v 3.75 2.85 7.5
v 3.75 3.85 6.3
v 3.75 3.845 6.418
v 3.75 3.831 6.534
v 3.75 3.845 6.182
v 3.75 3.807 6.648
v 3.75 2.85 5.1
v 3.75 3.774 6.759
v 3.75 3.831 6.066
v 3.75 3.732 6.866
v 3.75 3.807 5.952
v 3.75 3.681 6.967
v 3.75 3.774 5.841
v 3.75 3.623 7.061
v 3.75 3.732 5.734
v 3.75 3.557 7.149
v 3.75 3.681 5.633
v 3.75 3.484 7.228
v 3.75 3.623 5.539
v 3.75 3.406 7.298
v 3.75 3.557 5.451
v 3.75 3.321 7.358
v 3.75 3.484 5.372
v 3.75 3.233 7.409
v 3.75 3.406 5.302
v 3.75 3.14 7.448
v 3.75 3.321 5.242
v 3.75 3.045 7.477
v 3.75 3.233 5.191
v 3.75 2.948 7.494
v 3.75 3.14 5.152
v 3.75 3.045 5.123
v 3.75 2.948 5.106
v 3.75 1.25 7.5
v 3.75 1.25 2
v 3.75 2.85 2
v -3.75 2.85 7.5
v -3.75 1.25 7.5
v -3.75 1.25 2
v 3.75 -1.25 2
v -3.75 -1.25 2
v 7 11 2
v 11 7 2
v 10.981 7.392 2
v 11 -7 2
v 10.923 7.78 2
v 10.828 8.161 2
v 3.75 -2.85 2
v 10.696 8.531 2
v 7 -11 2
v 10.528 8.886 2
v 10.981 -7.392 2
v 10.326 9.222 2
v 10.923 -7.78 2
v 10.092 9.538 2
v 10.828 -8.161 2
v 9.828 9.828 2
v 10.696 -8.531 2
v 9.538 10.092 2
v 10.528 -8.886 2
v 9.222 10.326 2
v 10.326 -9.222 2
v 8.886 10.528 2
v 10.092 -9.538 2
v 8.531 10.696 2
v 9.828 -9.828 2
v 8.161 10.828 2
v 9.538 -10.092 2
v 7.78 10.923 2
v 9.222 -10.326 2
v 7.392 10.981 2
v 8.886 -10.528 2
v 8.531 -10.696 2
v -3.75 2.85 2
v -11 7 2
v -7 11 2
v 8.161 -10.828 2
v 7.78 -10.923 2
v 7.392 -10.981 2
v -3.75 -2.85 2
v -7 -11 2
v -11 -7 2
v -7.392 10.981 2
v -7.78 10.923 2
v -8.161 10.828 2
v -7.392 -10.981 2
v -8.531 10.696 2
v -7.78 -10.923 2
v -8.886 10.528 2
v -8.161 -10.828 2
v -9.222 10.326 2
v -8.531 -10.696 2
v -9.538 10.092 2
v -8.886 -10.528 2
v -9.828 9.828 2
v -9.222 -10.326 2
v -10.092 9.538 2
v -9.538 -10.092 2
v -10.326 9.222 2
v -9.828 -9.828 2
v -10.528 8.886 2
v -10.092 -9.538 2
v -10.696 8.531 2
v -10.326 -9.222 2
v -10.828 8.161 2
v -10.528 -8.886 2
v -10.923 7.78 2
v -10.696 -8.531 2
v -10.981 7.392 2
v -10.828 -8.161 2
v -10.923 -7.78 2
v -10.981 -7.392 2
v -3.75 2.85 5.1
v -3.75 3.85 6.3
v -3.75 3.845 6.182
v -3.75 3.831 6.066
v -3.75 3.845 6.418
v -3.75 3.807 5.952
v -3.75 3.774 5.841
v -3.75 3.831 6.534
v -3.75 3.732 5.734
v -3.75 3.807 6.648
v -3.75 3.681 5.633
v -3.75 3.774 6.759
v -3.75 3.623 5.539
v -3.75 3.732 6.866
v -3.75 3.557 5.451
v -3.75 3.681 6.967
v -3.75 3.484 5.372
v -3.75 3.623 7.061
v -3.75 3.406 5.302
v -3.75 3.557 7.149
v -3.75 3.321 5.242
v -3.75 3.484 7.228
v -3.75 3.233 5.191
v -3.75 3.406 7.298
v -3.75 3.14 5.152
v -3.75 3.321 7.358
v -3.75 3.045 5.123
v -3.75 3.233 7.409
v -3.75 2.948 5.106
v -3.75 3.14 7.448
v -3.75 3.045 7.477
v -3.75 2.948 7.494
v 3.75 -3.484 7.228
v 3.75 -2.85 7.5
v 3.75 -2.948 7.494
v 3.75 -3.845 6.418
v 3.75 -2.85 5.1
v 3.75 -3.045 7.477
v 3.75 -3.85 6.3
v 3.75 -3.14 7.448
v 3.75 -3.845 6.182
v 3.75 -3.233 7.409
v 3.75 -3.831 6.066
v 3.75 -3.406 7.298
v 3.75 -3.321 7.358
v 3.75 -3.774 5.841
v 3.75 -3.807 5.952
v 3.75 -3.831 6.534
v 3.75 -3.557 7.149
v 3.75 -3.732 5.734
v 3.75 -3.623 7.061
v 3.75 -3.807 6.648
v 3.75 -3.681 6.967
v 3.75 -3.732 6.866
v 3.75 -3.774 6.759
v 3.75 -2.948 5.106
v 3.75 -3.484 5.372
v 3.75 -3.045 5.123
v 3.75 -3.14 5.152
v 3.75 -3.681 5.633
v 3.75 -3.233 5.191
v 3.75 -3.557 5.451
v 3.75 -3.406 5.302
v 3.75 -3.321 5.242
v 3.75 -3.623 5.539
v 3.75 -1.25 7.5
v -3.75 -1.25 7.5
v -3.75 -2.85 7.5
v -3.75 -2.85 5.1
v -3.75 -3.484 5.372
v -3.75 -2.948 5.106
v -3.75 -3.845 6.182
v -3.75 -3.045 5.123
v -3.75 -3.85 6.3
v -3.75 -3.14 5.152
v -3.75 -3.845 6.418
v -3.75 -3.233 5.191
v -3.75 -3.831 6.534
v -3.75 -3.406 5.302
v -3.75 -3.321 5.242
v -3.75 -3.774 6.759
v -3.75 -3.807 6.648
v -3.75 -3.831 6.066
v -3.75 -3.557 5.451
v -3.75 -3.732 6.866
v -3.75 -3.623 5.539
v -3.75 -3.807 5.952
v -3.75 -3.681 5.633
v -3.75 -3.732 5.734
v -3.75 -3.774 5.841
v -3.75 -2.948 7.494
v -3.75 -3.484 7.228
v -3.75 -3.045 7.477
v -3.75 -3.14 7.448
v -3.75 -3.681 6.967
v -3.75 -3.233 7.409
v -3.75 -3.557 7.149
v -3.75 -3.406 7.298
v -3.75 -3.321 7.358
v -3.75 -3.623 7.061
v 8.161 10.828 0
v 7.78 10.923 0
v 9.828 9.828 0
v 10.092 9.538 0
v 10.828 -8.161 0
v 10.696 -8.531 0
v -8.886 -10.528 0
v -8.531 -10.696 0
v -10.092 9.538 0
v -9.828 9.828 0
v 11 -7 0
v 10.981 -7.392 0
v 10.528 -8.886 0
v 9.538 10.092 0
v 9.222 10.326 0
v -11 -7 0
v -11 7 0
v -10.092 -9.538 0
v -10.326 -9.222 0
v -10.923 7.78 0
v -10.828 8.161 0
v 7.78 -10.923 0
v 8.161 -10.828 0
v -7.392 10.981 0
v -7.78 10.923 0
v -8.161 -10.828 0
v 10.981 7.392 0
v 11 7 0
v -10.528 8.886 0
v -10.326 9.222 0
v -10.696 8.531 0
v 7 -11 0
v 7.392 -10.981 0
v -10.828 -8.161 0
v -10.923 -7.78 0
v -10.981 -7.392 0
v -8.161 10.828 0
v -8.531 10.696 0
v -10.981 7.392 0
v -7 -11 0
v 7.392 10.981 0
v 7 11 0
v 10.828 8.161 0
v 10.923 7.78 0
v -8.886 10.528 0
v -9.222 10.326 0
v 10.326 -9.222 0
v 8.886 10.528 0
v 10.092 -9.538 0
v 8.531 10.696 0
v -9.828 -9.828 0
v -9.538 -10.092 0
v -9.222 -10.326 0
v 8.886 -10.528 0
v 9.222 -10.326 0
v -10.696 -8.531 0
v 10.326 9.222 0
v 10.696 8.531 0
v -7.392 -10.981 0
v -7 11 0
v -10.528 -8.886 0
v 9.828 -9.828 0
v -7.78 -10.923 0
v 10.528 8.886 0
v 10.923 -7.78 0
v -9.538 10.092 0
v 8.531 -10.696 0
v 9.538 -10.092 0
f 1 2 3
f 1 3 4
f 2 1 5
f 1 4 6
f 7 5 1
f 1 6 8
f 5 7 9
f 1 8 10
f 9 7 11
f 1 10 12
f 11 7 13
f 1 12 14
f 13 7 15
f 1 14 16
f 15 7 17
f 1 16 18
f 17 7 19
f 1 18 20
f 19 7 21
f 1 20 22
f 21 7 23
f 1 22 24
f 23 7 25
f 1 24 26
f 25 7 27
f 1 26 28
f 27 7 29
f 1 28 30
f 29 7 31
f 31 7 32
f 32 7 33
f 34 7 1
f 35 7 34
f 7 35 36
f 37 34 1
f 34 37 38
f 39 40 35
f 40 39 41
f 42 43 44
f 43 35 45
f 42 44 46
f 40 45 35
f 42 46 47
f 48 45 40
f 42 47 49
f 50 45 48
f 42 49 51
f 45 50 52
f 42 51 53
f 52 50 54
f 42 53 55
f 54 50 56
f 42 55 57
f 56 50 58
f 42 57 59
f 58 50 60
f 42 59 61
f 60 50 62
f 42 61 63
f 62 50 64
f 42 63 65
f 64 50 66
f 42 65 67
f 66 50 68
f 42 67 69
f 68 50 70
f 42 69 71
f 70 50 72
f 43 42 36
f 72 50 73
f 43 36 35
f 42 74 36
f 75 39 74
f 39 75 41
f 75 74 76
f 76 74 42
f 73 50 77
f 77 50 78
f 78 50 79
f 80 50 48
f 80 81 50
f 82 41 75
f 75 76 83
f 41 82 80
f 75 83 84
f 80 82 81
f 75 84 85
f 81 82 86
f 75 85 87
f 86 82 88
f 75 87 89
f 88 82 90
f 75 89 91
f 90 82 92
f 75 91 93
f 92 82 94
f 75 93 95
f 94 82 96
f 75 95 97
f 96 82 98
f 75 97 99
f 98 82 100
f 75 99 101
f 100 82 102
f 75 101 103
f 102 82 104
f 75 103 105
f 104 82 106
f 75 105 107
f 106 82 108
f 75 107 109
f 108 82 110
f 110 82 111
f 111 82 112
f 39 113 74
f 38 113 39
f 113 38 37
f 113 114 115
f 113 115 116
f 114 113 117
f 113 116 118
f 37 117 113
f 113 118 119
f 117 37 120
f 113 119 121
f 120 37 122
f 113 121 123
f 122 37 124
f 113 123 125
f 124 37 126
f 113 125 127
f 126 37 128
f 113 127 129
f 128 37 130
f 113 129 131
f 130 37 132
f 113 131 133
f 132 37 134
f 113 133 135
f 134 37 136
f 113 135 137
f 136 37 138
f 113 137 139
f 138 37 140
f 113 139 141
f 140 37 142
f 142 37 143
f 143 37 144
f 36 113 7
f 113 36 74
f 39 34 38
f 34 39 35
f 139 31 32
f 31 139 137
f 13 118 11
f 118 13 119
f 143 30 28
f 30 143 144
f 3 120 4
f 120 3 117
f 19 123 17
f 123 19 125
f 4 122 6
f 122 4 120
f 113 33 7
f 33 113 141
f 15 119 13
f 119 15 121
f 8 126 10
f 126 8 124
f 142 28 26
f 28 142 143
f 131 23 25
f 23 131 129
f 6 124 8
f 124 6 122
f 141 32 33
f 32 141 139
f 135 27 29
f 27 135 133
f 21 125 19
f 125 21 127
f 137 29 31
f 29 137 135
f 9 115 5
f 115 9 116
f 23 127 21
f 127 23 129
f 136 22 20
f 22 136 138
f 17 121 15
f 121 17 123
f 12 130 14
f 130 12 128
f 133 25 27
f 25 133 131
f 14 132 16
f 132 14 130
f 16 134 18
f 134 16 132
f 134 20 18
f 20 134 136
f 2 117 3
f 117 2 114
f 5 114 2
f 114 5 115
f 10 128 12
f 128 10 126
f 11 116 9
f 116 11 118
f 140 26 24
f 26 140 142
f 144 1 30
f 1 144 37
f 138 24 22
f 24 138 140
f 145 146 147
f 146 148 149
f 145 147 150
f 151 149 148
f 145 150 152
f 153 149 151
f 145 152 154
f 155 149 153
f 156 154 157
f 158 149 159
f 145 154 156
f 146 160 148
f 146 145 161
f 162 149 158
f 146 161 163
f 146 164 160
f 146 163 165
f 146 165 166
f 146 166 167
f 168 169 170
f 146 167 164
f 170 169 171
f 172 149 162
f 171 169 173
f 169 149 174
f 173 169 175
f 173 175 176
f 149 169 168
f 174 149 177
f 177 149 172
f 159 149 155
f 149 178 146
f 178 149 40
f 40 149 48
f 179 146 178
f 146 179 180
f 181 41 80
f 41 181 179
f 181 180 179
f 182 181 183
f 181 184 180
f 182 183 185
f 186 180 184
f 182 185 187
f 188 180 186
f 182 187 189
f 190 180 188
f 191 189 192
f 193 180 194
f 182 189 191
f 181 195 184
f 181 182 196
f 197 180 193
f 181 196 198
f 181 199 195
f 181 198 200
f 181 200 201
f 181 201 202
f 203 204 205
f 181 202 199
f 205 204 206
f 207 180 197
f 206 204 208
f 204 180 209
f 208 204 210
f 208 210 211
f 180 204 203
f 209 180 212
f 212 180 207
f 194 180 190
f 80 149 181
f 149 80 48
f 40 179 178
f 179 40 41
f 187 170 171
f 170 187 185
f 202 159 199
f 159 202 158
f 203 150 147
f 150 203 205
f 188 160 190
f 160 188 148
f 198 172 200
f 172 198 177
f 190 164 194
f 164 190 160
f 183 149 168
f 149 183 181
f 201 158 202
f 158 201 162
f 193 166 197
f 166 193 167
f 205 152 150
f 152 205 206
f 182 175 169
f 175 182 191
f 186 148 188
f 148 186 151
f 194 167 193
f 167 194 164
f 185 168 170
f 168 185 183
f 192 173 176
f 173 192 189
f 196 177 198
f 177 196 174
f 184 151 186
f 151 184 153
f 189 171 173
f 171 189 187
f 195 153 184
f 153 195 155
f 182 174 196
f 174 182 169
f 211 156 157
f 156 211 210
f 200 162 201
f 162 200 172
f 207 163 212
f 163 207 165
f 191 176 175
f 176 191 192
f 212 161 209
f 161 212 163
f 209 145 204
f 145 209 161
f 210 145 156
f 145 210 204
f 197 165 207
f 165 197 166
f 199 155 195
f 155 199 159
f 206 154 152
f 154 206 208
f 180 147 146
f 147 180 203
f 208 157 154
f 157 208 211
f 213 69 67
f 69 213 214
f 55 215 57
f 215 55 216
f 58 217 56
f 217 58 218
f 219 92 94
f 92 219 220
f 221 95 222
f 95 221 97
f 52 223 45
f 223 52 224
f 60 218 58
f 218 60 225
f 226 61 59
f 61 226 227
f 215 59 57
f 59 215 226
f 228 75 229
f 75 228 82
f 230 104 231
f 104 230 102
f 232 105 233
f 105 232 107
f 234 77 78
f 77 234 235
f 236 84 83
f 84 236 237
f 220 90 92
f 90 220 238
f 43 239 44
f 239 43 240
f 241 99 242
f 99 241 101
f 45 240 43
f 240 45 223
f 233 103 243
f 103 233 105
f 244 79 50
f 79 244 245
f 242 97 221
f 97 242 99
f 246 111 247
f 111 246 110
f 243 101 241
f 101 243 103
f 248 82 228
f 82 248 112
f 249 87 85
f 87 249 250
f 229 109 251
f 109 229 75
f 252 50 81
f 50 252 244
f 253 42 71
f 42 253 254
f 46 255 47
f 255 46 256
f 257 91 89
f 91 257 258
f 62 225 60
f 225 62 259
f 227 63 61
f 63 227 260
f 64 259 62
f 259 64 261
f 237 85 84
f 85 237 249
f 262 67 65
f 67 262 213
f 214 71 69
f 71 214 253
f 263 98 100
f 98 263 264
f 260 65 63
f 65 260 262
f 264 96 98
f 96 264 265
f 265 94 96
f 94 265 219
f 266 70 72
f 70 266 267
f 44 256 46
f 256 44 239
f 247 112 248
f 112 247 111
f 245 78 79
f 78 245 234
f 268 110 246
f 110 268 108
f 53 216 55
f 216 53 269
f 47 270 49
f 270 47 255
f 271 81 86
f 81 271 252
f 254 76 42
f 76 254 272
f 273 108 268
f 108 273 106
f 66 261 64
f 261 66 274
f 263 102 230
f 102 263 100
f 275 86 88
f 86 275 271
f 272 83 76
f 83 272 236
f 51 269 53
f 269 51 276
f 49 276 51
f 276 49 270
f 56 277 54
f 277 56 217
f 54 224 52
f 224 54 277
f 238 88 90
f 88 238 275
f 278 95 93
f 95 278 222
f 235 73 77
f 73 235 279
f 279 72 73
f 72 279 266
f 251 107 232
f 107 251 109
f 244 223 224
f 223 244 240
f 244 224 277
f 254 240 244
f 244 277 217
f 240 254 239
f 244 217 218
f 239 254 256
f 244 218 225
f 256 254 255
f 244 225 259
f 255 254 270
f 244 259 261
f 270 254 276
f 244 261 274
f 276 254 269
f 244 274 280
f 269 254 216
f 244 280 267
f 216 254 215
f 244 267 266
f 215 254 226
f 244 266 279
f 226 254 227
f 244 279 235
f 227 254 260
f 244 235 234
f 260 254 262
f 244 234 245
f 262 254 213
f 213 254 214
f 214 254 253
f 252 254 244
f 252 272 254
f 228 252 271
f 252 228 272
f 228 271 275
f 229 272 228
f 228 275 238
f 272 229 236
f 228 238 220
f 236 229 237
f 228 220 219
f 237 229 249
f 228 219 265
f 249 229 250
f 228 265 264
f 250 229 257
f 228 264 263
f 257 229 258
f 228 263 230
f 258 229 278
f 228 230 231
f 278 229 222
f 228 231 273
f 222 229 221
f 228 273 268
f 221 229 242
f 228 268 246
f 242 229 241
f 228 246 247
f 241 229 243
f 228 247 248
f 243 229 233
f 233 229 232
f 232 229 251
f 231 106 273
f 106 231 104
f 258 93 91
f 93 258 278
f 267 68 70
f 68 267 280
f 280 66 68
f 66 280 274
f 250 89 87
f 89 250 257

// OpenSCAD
$fn=64;

//28,10
poleR=10;



// clip();

// buckleHalf();

// translate([0,40,0]) buckleBottom();

// translate([0,0,1]) mirror([0,0,1]) 
//  buckleTop();



// buckle();

// mirror([0,0,1]) translate([20,-5,4]) button();

buttonCap();

//barClamp();
// difference() {
//   cylinder(r=4,h=6);
//   screwHole(23,true);
// }

module barClamp() {
  h=20;
  ir=11;
  ga=30;

  translate([0,0,-10]) intersection() {
    difference() {
      cylinder(r=ir+3,h=h);
      translate([0,0,-0.1]) cylinder(r=ir,h=h+0.2);
    }
    union() {
      translate([-1000,0,0]) cube([2000,1000,1000]);
      rotate([0,0,ga]) translate([-1000,-1000,0]) cube([2000,1000,1000]);
    }
  }
  translate([-10-ir-3,3,0]) mirror([1,0,0]) rotate([90,0,0]) tabThing(3);
  rotate([0,0,ga]) translate([-10-ir-3,0,0]) mirror([1,0,0]) rotate([90,0,0]) tabThing(3);
}

module buttonCap() {
  hull() {
    translate([-7,-7,0]) cylinder(r=4,h=2);
    translate([7,7,0]) cylinder(r=4,h=2);
    translate([-7,7,0]) cylinder(r=4,h=2);
    translate([7,-7,0]) cylinder(r=4,h=2);
  }
  translate([-7.5/2,1.25,2]) {
    cube([7.5,1.6,5.5]);
    translate([0,1.6,4.3]) rotate([0,90,0]) scale([1.2,1,1]) cylinder(r=1,h=7.5);
  }
  mirror([0,1,0]) translate([-7.5/2,1.25,2]) {
    cube([7.5,1.6,5.5]);
    translate([0,1.6,4.3]) rotate([0,90,0]) scale([1.2,1,1]) cylinder(r=1,h=7.5);
  }
  // translate([0,-7/2,0]) color("red") cube([1,7,3]);
}


module button() {
  translate([3,0,0]) {
    difference() {
      union() {
        cube([10,10,6]);
        translate([(10-2.8)/2,(10-21.5)/2,0]) cube([2.8,21.5,6]);
      }
      translate([1.2,1.5,0.1]) cube([7.6,7,6.1]);
      translate([1.2,1.5,2]) {
        rotate([0,90,0]) cylinder(r=1,h=7.6);
        translate([0,7,0])rotate([0,90,0]) cylinder(r=1,h=7.6);
      }
    }
  }
  mirror([0,0,1]) hull() {
    cube([16,10,0.5]);
    translate([10,0,0]) cube([0.2,10,4]);
  }
}

module buckle() {
color("grey") {
  translate([0,-11,2.1]) {
    cube([40,22,2.5]);
    translate([-10,-10,0]) cube([10,42,2.5]);
  }
}
}


module buckleTop() {
  difference() {
    buckleHalf(false);
    translate([22.6,-5.25,-10]) {
      cube([10.5,10.5,10.1]);
      translate([3.75,-5.75,0]) cube([3,22,10.1]);
      
      translate([-3,0,4]) cube([16.5,10.5,10.1]);
    }
  }
      
  difference() {
    union() {
      translate([2.9+35.4/2,-10,0]) cylinder(r=6,h=1.5);
      translate([2.9+35.4/2,10,0]) cylinder(r=6,h=1.5);
    }
    translate([-0.1,-11,-0.1]) cube([42,22,1.7]);
  }

}

module buckleBottom() {
  difference() {
    buckleHalf(true);
    translate([2.9,-10.2,-3.7]) {
      cube([35.4,20.4,3.8]);
      translate([35.4/2,0.2,0]) cylinder(r=6.2,h=3.8);
      translate([35.4/2,20.2,0]) cylinder(r=6.2,h=3.8);

    }
    translate([6,-6,-6]) {
      cube([30,12,6.1]);
      translate([20,0,-1]) cube([10,12,7.1]);
    }

  }
}

module buckleHalf(nut=false) {
  bz=8;

  difference() {
    hull() {
      translate([40,14,-bz]) cylinder(r=5,h=bz);
      translate([40,-14,-bz]) cylinder(r=5,h=bz);
      translate([5,14,-bz]) cylinder(r=5,h=bz);
      translate([5,-14,-bz]) cylinder(r=5,h=bz);
    }

    translate([40,14,-bz]) screwHole(bz,nut);
    translate([40,-14,-bz]) screwHole(bz,nut);
    translate([5,14,-bz]) screwHole(bz,nut);
    translate([5,-14,-bz]) screwHole(bz,nut);
    translate([-0.1,-11,-1.5]) cube([42,22,1.6]);
    translate([0,-10.5,-1.5]) cylinder(r=2,h=1.6);
    translate([0,10.5,-1.5]) cylinder(r=2,h=1.6);
  }
  translate([45+10,0,-bz]) tabThing(4);
}

module tabThing(t) {
  difference() {
    union() {
      cylinder(r=10,h=t);
      translate([-11,-10,0]) cube([11,20,t]);
    }
    translate([0,0,-0.1]) cylinder(r=3.2,h=t+0.2);
  }
}

module screwHole(h,nut) {
  translate([0,0,-0.1]) {
    cylinder(r=1.7,h=h+0.2);
    if(!nut) {
      cylinder(r=3,h=3);
    }else{
      cylinder(r=3,h=3,$fn=6);
    }
  }
}

module clip() {
  clipH=5;
  translate([3,-10,-3.5]) difference() {
    union() {
      difference() {
        cube([35,20,2]);
        translate([4,4,-0.1]) cube([28,12,2.2]);
      }
      translate([4,5,0]) hull() {
        cube([27,10,2]);
        translate([26.9,0,0]) cube([0.1,10,clipH]);
      }
      difference() {
        union() {
          translate([35/2,20,0]) cylinder(r=6,h=2);
          translate([35/2,0,0]) cylinder(r=6,h=2);
        }
        translate([0,0,-0.1]) cube([100,20,2.2]);
      }
    }
    translate([4,5,-0.1]) cylinder(r=1.5,h=10.1);
    translate([4,15,-0.1]) cylinder(r=1.5,h=10.1);
  }
  
}
